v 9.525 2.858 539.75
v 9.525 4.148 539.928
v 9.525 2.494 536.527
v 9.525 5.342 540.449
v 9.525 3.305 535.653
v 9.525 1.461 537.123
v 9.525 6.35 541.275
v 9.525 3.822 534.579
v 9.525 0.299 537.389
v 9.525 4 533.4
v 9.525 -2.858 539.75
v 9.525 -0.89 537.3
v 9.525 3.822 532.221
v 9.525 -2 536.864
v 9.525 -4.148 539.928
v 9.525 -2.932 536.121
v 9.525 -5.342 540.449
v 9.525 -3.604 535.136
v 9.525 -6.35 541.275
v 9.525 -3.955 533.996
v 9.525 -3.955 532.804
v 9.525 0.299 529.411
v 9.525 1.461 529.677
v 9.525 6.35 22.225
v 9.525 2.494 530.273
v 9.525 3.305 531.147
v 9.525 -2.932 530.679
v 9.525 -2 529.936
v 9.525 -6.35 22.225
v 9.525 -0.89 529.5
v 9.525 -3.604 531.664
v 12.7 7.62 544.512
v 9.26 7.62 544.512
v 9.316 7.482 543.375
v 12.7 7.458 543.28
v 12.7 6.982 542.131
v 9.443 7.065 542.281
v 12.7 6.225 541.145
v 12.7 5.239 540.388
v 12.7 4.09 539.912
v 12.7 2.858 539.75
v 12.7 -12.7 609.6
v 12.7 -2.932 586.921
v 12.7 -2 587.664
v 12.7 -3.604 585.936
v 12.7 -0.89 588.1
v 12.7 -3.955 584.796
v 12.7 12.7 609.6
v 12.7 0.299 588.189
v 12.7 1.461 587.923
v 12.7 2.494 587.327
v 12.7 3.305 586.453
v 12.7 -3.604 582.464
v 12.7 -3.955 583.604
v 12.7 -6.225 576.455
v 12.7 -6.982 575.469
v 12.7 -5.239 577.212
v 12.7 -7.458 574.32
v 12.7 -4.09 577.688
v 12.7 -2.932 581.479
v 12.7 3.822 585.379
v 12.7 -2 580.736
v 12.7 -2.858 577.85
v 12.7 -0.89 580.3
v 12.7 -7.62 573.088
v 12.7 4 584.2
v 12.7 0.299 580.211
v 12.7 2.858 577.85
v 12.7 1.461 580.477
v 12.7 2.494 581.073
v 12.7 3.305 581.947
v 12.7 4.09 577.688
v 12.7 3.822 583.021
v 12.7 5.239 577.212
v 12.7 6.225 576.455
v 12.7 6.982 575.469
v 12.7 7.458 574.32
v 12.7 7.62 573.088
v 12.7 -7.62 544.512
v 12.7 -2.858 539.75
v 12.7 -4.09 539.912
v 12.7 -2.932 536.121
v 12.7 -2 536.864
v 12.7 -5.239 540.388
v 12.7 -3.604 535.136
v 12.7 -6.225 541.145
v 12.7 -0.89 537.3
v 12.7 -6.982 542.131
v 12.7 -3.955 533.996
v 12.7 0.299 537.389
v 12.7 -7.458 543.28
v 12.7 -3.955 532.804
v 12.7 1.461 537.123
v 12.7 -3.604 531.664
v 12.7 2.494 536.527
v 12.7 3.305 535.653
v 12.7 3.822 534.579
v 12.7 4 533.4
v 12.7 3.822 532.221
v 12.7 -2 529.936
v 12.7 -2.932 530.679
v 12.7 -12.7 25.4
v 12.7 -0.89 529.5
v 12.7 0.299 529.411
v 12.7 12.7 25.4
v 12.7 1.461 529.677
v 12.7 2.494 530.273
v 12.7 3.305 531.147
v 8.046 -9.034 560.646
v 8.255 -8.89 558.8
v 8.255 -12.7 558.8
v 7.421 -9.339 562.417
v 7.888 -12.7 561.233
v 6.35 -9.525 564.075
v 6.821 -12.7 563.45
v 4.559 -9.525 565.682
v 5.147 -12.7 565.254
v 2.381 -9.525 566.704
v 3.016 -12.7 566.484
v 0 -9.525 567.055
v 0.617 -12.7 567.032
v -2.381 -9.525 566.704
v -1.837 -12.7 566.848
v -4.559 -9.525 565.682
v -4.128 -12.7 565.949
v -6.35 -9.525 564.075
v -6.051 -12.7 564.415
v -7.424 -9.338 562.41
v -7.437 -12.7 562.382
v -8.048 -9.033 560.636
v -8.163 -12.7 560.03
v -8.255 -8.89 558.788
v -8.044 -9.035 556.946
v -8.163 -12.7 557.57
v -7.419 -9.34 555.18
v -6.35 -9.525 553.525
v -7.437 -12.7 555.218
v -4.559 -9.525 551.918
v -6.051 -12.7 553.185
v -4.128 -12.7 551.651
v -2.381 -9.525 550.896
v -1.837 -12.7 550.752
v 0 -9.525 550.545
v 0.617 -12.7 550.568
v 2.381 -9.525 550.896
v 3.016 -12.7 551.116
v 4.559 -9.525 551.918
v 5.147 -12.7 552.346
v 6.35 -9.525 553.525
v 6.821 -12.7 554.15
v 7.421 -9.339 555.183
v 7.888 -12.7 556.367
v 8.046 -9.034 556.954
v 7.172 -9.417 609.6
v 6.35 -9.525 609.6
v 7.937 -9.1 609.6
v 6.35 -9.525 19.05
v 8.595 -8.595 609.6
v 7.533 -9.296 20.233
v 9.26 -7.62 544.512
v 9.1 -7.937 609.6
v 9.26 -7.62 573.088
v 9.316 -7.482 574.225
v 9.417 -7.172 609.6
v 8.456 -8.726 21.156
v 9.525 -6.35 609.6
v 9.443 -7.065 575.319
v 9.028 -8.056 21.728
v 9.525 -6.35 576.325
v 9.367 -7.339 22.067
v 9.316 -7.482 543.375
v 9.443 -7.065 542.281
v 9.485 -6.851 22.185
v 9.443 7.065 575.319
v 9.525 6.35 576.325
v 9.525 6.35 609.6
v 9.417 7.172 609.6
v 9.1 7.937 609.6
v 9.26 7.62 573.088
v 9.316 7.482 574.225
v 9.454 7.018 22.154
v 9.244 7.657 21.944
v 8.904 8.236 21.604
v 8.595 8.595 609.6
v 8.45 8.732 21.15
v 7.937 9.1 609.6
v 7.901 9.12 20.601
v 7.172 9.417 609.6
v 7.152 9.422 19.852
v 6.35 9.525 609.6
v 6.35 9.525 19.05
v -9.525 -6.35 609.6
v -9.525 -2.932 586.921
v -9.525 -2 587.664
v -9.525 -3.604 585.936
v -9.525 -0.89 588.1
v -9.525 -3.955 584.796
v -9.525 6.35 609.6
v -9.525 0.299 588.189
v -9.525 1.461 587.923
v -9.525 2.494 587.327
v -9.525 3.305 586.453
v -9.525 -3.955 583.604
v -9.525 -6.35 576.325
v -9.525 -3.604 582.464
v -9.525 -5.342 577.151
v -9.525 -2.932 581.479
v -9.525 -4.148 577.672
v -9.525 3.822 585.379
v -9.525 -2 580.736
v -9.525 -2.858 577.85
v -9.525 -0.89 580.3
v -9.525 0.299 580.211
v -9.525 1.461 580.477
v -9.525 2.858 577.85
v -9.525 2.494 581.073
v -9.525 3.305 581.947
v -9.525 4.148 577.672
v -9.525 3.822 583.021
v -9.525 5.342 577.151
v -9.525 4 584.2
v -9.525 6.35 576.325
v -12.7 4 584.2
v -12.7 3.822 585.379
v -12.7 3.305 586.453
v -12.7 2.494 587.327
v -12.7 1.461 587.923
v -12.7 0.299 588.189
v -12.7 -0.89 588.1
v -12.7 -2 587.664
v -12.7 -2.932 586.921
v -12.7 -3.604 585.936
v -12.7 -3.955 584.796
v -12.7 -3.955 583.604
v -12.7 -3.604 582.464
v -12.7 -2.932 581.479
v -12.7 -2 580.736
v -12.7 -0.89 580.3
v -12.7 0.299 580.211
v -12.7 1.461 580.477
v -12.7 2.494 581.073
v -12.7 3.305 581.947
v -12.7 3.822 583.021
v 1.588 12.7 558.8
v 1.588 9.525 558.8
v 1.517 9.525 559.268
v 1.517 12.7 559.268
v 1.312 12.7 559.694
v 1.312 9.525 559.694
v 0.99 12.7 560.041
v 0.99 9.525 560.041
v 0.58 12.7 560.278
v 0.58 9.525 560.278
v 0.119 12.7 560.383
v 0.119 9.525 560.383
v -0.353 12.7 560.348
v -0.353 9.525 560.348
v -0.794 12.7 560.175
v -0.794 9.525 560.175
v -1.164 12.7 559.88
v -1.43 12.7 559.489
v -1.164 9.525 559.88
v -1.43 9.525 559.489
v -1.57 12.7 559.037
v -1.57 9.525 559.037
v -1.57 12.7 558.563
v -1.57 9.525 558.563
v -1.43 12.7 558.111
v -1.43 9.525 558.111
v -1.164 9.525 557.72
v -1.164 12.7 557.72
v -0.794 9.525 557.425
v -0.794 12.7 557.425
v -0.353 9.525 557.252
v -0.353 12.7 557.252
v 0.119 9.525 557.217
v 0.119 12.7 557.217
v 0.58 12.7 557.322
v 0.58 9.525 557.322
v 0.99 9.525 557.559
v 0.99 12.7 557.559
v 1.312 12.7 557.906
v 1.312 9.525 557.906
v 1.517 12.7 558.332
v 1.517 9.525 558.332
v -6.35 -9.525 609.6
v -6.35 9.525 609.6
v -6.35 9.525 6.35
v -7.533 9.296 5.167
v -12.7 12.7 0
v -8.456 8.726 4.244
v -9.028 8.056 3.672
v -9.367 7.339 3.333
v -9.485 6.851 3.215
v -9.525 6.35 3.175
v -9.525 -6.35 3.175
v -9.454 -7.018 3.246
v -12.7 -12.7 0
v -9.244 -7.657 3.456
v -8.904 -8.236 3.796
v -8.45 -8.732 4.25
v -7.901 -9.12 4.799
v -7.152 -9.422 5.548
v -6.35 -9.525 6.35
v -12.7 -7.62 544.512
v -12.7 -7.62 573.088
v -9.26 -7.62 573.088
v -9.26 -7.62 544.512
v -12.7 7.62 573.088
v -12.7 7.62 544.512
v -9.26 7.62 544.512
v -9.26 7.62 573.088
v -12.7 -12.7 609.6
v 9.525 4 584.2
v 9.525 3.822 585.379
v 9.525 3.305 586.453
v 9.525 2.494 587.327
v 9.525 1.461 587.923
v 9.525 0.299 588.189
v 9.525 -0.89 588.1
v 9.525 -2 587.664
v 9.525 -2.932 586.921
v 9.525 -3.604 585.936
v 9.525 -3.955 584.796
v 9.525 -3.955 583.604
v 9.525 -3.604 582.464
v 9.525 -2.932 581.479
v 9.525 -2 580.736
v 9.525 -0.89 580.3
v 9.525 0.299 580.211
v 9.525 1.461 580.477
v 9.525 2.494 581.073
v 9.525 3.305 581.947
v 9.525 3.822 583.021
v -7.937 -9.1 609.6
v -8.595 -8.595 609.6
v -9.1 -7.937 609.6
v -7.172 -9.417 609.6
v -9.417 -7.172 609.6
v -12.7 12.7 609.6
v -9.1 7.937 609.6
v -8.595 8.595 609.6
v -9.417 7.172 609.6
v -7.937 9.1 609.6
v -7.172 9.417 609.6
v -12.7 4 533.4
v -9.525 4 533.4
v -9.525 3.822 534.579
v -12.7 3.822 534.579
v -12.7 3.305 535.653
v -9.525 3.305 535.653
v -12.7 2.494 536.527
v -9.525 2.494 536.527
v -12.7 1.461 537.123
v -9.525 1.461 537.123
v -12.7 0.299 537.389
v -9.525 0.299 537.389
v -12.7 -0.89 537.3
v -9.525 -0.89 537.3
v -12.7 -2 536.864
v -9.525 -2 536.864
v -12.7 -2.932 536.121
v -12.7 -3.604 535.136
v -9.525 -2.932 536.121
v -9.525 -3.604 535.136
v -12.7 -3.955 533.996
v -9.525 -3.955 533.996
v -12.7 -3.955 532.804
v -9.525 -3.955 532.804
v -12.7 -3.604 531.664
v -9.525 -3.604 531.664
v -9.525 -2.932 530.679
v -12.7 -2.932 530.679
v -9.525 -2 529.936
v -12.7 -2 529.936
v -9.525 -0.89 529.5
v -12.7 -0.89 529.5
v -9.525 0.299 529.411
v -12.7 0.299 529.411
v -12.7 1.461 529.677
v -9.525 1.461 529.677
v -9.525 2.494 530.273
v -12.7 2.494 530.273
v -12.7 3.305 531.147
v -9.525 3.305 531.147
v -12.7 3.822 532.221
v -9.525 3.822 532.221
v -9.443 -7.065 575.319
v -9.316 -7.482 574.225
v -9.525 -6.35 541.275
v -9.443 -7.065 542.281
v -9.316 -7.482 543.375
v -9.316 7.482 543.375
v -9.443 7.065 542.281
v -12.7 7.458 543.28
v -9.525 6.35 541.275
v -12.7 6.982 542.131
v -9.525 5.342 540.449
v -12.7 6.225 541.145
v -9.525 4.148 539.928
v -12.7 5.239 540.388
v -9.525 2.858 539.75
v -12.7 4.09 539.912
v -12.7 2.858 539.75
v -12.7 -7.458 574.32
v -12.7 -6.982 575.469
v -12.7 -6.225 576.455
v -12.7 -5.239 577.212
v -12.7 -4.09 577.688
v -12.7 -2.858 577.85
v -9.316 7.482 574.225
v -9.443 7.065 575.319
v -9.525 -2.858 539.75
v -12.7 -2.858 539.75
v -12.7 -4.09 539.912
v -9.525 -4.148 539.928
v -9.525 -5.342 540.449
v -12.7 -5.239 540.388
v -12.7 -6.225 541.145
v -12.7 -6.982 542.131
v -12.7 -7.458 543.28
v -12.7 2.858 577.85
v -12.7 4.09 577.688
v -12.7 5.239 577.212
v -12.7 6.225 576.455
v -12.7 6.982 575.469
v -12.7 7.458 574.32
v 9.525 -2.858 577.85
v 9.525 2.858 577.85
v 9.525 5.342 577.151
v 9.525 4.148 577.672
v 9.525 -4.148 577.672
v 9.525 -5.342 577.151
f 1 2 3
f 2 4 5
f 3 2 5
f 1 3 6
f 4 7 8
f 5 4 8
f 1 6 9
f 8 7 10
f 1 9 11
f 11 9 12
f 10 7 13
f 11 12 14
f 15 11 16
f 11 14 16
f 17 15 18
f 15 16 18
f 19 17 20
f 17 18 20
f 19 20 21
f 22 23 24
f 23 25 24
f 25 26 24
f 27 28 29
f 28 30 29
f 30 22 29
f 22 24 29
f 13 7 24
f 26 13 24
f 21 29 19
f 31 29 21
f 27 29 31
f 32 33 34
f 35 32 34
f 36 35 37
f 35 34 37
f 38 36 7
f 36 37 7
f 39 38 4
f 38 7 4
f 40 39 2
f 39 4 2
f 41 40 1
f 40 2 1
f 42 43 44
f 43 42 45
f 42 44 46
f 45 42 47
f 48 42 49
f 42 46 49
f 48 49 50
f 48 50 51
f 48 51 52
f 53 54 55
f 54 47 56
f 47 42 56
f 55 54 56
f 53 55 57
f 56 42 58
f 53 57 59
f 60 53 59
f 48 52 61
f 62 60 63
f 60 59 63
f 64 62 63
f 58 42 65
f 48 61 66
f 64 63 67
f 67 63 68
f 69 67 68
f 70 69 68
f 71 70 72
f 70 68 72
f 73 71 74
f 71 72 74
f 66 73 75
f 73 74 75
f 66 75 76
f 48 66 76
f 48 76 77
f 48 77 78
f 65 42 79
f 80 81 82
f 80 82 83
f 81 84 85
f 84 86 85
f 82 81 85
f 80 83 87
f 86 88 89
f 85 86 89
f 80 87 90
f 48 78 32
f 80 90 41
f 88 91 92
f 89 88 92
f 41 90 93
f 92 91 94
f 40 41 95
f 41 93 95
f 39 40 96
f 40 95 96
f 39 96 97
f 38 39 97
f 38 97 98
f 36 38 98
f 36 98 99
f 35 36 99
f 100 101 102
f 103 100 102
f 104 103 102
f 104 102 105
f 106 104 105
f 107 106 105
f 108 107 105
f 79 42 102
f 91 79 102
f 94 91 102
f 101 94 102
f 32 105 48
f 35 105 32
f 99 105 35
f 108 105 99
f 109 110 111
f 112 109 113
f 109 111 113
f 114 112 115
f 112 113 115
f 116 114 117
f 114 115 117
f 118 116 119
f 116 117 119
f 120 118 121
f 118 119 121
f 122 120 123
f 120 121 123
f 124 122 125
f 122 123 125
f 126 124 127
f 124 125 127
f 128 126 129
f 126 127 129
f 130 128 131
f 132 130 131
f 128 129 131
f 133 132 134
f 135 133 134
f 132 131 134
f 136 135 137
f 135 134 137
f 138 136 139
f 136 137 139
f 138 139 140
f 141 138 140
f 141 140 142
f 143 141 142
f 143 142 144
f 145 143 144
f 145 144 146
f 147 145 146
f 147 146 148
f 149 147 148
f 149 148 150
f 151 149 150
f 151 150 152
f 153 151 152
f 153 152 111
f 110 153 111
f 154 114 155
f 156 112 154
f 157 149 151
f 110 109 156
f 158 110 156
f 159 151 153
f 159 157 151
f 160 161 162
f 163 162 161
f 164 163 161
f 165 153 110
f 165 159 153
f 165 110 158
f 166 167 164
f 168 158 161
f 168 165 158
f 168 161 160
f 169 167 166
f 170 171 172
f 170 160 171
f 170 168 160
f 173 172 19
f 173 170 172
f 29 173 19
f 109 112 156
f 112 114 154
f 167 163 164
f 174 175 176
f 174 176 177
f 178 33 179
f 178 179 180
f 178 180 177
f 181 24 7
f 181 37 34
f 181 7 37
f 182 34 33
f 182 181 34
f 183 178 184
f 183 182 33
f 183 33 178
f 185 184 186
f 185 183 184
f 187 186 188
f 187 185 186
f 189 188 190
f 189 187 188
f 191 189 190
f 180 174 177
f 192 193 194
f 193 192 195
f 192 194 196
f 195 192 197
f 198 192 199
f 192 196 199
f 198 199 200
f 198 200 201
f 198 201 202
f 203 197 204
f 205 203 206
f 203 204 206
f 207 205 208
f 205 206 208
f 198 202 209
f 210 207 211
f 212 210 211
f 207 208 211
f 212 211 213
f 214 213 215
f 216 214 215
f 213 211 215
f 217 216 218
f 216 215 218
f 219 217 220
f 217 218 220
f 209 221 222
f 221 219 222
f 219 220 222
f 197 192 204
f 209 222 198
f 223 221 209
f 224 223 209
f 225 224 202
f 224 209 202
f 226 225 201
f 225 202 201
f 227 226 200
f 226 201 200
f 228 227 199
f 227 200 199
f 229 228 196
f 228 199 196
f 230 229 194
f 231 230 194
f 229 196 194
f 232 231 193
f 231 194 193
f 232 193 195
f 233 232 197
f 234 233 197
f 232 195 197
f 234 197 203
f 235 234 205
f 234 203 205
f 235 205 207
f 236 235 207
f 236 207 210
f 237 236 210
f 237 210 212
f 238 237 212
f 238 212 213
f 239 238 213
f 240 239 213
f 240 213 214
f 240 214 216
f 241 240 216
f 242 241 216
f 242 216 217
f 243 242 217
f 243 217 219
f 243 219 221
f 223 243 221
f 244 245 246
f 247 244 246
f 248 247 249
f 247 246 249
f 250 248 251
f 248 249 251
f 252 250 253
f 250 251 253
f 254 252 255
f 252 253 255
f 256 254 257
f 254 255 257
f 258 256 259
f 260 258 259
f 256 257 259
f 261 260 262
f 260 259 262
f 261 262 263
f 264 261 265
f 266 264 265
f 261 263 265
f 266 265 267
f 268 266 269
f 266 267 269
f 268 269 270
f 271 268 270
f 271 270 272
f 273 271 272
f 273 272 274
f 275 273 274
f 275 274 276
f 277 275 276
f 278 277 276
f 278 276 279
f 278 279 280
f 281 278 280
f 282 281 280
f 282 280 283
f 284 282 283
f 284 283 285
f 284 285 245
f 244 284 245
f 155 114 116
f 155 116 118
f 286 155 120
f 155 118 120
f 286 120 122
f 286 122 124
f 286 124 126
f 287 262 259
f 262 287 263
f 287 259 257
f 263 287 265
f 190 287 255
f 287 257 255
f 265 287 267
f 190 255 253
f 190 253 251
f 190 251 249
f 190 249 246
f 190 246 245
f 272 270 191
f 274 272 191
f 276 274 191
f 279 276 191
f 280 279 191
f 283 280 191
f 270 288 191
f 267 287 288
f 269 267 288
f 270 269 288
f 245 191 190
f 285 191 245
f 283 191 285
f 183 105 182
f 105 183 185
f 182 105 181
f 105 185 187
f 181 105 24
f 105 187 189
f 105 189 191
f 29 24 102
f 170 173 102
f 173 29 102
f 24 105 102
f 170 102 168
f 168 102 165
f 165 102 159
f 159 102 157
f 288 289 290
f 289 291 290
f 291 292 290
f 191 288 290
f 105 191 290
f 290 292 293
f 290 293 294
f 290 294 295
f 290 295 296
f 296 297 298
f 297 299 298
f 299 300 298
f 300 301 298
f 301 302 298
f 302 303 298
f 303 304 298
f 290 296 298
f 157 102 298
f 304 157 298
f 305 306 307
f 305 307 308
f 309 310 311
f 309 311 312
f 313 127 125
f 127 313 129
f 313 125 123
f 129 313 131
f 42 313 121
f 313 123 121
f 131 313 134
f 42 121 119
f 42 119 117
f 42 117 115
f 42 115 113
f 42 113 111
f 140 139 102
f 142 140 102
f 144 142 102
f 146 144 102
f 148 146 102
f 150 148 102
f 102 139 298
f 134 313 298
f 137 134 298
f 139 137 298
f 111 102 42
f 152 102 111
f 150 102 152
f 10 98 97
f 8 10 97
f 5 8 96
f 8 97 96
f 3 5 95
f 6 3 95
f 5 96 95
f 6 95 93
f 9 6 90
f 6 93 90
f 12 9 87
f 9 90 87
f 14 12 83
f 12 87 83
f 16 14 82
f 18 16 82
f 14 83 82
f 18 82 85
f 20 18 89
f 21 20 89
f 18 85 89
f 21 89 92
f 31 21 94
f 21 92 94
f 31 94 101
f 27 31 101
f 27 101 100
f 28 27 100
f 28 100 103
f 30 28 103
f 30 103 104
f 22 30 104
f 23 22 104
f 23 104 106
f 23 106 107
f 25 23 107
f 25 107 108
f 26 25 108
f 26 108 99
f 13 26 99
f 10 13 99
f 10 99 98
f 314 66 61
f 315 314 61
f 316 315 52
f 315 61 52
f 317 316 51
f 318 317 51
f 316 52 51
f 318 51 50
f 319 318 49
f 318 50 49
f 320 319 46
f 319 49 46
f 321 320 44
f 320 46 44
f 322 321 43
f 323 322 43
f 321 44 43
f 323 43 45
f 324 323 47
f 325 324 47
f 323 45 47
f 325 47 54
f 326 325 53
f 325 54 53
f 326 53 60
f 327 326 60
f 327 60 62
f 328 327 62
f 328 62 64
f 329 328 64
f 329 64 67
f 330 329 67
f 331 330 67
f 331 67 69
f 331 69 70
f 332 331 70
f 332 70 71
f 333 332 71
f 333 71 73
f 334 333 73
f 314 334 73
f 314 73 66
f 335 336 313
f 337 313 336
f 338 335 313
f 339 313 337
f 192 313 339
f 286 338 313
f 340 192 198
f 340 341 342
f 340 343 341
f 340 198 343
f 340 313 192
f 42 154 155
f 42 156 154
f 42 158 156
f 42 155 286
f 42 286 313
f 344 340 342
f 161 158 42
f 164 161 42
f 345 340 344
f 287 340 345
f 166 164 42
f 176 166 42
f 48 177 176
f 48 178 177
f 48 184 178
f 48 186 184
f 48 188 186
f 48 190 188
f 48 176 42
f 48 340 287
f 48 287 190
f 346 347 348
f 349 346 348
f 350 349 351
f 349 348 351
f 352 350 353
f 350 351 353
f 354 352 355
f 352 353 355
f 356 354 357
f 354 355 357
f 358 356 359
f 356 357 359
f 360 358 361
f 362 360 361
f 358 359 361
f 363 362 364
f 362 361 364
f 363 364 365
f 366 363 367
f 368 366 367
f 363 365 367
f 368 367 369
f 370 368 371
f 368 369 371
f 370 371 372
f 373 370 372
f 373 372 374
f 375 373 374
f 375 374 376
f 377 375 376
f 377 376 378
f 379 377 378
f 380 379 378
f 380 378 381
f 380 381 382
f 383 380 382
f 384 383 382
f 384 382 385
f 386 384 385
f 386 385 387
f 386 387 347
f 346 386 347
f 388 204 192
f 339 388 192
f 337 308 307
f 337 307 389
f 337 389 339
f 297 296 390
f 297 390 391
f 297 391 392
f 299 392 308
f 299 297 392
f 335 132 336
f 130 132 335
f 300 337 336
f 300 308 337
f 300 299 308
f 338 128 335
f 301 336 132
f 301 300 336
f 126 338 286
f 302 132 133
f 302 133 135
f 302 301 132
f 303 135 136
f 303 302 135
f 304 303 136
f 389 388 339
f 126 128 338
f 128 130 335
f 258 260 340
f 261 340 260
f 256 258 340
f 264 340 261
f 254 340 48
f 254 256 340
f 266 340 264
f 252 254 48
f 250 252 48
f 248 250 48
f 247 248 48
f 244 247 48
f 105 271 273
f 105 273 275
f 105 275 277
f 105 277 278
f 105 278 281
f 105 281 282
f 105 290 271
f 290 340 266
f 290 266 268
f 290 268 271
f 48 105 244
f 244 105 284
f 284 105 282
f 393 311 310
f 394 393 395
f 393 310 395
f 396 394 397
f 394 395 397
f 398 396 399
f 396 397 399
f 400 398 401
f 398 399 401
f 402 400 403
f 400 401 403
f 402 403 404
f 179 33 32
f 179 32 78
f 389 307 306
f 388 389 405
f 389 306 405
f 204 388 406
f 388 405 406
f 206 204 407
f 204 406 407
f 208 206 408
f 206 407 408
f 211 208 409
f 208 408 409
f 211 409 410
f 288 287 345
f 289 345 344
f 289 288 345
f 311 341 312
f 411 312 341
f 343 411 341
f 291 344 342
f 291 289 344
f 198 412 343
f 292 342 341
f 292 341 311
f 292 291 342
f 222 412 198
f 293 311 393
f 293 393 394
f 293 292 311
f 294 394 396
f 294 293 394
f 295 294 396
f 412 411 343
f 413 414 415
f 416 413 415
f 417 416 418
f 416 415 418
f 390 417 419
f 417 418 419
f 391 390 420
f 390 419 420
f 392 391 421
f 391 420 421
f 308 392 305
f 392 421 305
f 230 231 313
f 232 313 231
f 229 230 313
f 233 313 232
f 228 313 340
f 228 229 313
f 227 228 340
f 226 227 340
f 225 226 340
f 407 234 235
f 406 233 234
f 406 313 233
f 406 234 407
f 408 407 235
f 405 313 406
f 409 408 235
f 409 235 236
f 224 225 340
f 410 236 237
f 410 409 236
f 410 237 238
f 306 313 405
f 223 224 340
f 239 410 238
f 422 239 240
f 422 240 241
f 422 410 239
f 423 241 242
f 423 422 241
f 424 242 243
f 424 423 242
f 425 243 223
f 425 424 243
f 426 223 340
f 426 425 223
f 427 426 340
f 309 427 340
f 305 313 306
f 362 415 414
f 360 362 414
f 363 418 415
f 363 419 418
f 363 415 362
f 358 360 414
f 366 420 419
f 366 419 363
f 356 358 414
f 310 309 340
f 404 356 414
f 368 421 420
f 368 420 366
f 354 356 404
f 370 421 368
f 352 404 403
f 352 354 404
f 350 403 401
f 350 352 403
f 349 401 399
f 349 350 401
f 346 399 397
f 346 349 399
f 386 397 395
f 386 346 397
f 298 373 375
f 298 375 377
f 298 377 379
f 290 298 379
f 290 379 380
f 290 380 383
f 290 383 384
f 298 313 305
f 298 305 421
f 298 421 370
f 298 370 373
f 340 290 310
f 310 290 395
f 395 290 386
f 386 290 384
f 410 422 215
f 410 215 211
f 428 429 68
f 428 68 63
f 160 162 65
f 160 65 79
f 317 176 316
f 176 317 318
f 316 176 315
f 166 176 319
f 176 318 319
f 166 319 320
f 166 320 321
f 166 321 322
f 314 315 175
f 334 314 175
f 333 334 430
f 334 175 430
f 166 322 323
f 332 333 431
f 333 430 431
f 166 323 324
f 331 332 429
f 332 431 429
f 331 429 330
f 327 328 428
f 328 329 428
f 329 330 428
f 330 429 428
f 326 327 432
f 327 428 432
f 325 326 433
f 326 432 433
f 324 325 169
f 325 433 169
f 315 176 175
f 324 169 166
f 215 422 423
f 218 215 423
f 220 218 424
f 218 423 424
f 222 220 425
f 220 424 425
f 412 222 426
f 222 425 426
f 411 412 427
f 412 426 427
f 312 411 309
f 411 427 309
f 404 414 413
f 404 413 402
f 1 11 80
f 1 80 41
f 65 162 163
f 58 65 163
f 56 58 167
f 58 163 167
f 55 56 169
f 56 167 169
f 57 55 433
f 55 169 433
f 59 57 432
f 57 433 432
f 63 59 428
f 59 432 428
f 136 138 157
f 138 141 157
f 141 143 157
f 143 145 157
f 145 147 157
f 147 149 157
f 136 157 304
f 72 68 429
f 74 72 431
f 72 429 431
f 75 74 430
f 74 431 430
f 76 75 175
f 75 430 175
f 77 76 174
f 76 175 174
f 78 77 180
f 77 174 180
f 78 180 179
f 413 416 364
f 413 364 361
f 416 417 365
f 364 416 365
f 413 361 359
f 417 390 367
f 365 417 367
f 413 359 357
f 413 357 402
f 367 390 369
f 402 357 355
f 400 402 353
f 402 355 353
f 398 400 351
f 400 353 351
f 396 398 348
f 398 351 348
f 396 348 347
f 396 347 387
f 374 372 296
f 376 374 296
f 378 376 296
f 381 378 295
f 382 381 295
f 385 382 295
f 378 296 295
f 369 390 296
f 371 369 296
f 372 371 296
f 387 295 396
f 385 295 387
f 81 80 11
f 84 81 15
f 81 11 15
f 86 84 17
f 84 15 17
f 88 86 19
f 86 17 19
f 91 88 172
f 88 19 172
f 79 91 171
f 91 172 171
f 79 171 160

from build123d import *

# Parameters (mm, degrees)
SKETCH005_W     = 25.4
SKETCH005_H     = 25.4
PAD002_DEPTH    = 609.6
SKETCH006_R     = 4
POCKET003_DEPTH = 25.401
POCKET004_DEPTH = 25.401
POCKET007_DEPTH = 25.401
SKETCH012_R     = 8.255
POCKET008_DEPTH = 5.08
SKETCH013_R     = 1.5875
POCKET009_DEPTH = 25.401


with BuildPart() as part:
    # Sketch005 → Pad002 (new body)
    with BuildSketch(Plane.XY):
        Rectangle(SKETCH005_W, SKETCH005_H)
        with BuildLine():
            ThreePointArc((-9.525, -6.35), (-8.595064, -8.595064), (-6.35, -9.525))
            Line((6.35, -9.525), (-6.35, -9.525))
            ThreePointArc((6.35, -9.525), (8.595064, -8.595064), (9.525, -6.35))
            Line((9.525, 6.35), (9.525, -6.35))
            ThreePointArc((9.525, 6.35), (8.595064, 8.595064), (6.35, 9.525))
            Line((-6.35, 9.525), (6.35, 9.525))
            ThreePointArc((-6.35, 9.525), (-8.595064, 8.595064), (-9.525, 6.35))
            Line((-9.525, -6.35), (-9.525, 6.35))
        make_face(mode=Mode.SUBTRACT)
    extrude(amount=PAD002_DEPTH)

    # Sketch006 (on Face3 of Pad002) → Pocket003 (cut, through all)
    with BuildSketch(Plane.YZ.offset(12.7)):
        with Locations((0, 584.2)):
            Circle(SKETCH006_R)
        with Locations((0, 533.4)):
            Circle(SKETCH006_R)
    extrude(amount=-POCKET003_DEPTH, mode=Mode.SUBTRACT)

    # Sketch007 (on Face2 of Pocket003) → Pocket004 (cut, through all)
    with BuildSketch(Plane.XZ.offset(12.7)):
        Polygon((12.7, 25.4), (-12.7, 0), (12.7, 0), align=None)
    extrude(amount=-POCKET004_DEPTH, mode=Mode.SUBTRACT)

    # Sketch011 (on Face1 of Pocket004) → Pocket007 (cut, through all)
    with BuildSketch(Plane(origin=(-12.7, 0, 0), x_dir=(0, -1, 0), z_dir=(-1, 0, 0))):
        with BuildLine():
            ThreePointArc((-7.62, 544.5125), (-6.225096, 541.144904), (-2.8575, 539.75))
            Line((2.8575, 539.75), (-2.8575, 539.75))
            ThreePointArc((2.8575, 539.75), (6.225096, 541.144904), (7.62, 544.5125))
            Line((7.62, 573.0875), (7.62, 544.5125))
            ThreePointArc((7.62, 573.0875), (6.225096, 576.455096), (2.8575, 577.85))
            Line((-2.8575, 577.85), (2.8575, 577.85))
            ThreePointArc((-2.8575, 577.85), (-6.225096, 576.455096), (-7.62, 573.0875))
            Line((-7.62, 544.5125), (-7.62, 573.0875))
        make_face()
    extrude(amount=-POCKET007_DEPTH, mode=Mode.SUBTRACT)

    # Sketch012 (on Face2 of Pocket007) → Pocket008 (cut)
    with BuildSketch(Plane.XZ.offset(12.7)):
        with Locations((0, 558.8)):
            Circle(SKETCH012_R)
    extrude(amount=-POCKET008_DEPTH, mode=Mode.SUBTRACT)

    # Sketch013 (on Face2 of Pocket008) → Pocket009 (cut, through all)
    with BuildSketch(Plane.XZ.offset(12.7)):
        with Locations((0, 558.8)):
            Circle(SKETCH013_R)
    extrude(amount=-POCKET009_DEPTH, mode=Mode.SUBTRACT)


solid = part.part
